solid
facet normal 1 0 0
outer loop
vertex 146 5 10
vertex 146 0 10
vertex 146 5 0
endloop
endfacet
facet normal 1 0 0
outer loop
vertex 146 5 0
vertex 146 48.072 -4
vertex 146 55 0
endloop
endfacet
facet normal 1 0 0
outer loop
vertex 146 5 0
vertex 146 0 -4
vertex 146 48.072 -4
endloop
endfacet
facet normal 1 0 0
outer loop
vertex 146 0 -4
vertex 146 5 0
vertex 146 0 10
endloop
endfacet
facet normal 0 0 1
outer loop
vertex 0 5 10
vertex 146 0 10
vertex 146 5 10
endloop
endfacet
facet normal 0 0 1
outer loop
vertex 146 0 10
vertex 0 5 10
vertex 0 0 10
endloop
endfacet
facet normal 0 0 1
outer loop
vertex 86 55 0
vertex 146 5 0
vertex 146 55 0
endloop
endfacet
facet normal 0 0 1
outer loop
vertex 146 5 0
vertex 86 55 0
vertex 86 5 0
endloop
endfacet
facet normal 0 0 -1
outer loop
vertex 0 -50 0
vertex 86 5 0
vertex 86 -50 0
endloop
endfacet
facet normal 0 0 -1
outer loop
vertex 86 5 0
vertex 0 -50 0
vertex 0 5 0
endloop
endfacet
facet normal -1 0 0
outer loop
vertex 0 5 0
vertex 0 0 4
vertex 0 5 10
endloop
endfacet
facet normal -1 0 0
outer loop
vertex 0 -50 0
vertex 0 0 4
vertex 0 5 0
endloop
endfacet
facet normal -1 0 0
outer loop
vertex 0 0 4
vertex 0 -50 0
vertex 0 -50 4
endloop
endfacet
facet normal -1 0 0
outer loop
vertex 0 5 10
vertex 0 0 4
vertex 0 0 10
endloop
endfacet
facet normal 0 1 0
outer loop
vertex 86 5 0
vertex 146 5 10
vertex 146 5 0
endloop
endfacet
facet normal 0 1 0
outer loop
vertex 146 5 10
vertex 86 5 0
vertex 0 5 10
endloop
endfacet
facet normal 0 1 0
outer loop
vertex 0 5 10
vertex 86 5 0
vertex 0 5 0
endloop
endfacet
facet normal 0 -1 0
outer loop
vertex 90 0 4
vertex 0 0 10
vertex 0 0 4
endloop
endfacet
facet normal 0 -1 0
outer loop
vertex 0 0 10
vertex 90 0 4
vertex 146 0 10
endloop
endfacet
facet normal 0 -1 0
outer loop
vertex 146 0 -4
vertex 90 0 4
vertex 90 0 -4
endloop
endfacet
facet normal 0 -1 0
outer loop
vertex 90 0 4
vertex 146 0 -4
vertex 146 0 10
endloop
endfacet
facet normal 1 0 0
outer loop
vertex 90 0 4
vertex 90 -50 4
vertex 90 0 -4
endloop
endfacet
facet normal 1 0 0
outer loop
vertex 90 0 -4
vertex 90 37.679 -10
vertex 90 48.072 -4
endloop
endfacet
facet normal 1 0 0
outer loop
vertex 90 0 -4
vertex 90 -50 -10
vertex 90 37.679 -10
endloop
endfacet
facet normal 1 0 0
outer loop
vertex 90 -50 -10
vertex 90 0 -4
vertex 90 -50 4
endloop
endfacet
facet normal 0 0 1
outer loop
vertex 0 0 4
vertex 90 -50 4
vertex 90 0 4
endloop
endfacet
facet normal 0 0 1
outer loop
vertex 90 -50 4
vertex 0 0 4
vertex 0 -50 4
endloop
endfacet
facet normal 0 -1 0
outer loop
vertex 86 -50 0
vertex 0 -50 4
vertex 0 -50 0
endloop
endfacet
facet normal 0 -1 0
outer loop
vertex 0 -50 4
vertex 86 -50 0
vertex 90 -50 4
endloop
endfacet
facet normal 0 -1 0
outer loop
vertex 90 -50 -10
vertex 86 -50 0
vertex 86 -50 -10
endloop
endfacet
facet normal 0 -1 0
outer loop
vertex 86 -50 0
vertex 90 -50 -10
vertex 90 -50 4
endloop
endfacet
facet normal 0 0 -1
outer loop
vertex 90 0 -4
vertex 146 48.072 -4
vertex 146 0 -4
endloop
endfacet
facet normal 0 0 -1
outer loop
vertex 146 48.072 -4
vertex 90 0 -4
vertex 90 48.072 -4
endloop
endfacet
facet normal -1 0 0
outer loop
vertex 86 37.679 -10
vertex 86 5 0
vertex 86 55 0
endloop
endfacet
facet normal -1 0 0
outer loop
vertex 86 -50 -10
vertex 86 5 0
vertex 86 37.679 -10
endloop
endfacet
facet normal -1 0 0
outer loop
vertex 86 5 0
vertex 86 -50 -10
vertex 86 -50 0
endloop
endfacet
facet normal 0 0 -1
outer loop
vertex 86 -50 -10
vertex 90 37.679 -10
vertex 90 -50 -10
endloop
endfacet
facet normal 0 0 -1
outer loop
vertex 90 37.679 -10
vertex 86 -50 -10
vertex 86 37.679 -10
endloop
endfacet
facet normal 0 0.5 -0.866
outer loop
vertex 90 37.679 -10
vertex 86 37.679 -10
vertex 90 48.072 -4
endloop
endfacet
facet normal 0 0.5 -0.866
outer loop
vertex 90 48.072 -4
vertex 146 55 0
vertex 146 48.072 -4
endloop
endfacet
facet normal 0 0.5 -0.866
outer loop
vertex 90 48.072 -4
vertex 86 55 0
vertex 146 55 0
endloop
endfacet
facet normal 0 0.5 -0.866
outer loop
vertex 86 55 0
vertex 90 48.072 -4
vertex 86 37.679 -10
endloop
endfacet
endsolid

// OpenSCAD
hand_support_width=50;
hand_support_length=90;
hand_support_height=4;
saw_support_length=60;
saw_support_width=50;
saw_support_height=4;
material_guide_length=4;
material_guide_height=10;
saw_guide_length=saw_support_length+hand_support_length-material_guide_length;
saw_guide_width=5;
saw_guide_height=10;
material_guide_width=hand_support_width+saw_guide_width+saw_support_width;
saw_support_incline=60;


difference() {
    union () {
        cube([saw_guide_length, saw_guide_width, saw_guide_height]);
        translate([0, -hand_support_width, 0]) {
            cube([hand_support_length, hand_support_width, hand_support_height]);
        }
        translate([hand_support_length-material_guide_length, 0, -saw_support_height]) {
            cube([saw_support_length, saw_support_width+saw_guide_width, saw_support_height]);
        }
        translate([hand_support_length-material_guide_length, -hand_support_width, -material_guide_height]) {
            cube([material_guide_length, material_guide_width, material_guide_height]);
        }
    }

    translate([hand_support_length-material_guide_length-1, saw_support_width+saw_guide_width, 0]) {
        mirror([0, 0, 1])
        rotate([saw_support_incline, 0, 0])
        cube([saw_support_length+2, material_guide_height*2, material_guide_height*3]);
    }
}
